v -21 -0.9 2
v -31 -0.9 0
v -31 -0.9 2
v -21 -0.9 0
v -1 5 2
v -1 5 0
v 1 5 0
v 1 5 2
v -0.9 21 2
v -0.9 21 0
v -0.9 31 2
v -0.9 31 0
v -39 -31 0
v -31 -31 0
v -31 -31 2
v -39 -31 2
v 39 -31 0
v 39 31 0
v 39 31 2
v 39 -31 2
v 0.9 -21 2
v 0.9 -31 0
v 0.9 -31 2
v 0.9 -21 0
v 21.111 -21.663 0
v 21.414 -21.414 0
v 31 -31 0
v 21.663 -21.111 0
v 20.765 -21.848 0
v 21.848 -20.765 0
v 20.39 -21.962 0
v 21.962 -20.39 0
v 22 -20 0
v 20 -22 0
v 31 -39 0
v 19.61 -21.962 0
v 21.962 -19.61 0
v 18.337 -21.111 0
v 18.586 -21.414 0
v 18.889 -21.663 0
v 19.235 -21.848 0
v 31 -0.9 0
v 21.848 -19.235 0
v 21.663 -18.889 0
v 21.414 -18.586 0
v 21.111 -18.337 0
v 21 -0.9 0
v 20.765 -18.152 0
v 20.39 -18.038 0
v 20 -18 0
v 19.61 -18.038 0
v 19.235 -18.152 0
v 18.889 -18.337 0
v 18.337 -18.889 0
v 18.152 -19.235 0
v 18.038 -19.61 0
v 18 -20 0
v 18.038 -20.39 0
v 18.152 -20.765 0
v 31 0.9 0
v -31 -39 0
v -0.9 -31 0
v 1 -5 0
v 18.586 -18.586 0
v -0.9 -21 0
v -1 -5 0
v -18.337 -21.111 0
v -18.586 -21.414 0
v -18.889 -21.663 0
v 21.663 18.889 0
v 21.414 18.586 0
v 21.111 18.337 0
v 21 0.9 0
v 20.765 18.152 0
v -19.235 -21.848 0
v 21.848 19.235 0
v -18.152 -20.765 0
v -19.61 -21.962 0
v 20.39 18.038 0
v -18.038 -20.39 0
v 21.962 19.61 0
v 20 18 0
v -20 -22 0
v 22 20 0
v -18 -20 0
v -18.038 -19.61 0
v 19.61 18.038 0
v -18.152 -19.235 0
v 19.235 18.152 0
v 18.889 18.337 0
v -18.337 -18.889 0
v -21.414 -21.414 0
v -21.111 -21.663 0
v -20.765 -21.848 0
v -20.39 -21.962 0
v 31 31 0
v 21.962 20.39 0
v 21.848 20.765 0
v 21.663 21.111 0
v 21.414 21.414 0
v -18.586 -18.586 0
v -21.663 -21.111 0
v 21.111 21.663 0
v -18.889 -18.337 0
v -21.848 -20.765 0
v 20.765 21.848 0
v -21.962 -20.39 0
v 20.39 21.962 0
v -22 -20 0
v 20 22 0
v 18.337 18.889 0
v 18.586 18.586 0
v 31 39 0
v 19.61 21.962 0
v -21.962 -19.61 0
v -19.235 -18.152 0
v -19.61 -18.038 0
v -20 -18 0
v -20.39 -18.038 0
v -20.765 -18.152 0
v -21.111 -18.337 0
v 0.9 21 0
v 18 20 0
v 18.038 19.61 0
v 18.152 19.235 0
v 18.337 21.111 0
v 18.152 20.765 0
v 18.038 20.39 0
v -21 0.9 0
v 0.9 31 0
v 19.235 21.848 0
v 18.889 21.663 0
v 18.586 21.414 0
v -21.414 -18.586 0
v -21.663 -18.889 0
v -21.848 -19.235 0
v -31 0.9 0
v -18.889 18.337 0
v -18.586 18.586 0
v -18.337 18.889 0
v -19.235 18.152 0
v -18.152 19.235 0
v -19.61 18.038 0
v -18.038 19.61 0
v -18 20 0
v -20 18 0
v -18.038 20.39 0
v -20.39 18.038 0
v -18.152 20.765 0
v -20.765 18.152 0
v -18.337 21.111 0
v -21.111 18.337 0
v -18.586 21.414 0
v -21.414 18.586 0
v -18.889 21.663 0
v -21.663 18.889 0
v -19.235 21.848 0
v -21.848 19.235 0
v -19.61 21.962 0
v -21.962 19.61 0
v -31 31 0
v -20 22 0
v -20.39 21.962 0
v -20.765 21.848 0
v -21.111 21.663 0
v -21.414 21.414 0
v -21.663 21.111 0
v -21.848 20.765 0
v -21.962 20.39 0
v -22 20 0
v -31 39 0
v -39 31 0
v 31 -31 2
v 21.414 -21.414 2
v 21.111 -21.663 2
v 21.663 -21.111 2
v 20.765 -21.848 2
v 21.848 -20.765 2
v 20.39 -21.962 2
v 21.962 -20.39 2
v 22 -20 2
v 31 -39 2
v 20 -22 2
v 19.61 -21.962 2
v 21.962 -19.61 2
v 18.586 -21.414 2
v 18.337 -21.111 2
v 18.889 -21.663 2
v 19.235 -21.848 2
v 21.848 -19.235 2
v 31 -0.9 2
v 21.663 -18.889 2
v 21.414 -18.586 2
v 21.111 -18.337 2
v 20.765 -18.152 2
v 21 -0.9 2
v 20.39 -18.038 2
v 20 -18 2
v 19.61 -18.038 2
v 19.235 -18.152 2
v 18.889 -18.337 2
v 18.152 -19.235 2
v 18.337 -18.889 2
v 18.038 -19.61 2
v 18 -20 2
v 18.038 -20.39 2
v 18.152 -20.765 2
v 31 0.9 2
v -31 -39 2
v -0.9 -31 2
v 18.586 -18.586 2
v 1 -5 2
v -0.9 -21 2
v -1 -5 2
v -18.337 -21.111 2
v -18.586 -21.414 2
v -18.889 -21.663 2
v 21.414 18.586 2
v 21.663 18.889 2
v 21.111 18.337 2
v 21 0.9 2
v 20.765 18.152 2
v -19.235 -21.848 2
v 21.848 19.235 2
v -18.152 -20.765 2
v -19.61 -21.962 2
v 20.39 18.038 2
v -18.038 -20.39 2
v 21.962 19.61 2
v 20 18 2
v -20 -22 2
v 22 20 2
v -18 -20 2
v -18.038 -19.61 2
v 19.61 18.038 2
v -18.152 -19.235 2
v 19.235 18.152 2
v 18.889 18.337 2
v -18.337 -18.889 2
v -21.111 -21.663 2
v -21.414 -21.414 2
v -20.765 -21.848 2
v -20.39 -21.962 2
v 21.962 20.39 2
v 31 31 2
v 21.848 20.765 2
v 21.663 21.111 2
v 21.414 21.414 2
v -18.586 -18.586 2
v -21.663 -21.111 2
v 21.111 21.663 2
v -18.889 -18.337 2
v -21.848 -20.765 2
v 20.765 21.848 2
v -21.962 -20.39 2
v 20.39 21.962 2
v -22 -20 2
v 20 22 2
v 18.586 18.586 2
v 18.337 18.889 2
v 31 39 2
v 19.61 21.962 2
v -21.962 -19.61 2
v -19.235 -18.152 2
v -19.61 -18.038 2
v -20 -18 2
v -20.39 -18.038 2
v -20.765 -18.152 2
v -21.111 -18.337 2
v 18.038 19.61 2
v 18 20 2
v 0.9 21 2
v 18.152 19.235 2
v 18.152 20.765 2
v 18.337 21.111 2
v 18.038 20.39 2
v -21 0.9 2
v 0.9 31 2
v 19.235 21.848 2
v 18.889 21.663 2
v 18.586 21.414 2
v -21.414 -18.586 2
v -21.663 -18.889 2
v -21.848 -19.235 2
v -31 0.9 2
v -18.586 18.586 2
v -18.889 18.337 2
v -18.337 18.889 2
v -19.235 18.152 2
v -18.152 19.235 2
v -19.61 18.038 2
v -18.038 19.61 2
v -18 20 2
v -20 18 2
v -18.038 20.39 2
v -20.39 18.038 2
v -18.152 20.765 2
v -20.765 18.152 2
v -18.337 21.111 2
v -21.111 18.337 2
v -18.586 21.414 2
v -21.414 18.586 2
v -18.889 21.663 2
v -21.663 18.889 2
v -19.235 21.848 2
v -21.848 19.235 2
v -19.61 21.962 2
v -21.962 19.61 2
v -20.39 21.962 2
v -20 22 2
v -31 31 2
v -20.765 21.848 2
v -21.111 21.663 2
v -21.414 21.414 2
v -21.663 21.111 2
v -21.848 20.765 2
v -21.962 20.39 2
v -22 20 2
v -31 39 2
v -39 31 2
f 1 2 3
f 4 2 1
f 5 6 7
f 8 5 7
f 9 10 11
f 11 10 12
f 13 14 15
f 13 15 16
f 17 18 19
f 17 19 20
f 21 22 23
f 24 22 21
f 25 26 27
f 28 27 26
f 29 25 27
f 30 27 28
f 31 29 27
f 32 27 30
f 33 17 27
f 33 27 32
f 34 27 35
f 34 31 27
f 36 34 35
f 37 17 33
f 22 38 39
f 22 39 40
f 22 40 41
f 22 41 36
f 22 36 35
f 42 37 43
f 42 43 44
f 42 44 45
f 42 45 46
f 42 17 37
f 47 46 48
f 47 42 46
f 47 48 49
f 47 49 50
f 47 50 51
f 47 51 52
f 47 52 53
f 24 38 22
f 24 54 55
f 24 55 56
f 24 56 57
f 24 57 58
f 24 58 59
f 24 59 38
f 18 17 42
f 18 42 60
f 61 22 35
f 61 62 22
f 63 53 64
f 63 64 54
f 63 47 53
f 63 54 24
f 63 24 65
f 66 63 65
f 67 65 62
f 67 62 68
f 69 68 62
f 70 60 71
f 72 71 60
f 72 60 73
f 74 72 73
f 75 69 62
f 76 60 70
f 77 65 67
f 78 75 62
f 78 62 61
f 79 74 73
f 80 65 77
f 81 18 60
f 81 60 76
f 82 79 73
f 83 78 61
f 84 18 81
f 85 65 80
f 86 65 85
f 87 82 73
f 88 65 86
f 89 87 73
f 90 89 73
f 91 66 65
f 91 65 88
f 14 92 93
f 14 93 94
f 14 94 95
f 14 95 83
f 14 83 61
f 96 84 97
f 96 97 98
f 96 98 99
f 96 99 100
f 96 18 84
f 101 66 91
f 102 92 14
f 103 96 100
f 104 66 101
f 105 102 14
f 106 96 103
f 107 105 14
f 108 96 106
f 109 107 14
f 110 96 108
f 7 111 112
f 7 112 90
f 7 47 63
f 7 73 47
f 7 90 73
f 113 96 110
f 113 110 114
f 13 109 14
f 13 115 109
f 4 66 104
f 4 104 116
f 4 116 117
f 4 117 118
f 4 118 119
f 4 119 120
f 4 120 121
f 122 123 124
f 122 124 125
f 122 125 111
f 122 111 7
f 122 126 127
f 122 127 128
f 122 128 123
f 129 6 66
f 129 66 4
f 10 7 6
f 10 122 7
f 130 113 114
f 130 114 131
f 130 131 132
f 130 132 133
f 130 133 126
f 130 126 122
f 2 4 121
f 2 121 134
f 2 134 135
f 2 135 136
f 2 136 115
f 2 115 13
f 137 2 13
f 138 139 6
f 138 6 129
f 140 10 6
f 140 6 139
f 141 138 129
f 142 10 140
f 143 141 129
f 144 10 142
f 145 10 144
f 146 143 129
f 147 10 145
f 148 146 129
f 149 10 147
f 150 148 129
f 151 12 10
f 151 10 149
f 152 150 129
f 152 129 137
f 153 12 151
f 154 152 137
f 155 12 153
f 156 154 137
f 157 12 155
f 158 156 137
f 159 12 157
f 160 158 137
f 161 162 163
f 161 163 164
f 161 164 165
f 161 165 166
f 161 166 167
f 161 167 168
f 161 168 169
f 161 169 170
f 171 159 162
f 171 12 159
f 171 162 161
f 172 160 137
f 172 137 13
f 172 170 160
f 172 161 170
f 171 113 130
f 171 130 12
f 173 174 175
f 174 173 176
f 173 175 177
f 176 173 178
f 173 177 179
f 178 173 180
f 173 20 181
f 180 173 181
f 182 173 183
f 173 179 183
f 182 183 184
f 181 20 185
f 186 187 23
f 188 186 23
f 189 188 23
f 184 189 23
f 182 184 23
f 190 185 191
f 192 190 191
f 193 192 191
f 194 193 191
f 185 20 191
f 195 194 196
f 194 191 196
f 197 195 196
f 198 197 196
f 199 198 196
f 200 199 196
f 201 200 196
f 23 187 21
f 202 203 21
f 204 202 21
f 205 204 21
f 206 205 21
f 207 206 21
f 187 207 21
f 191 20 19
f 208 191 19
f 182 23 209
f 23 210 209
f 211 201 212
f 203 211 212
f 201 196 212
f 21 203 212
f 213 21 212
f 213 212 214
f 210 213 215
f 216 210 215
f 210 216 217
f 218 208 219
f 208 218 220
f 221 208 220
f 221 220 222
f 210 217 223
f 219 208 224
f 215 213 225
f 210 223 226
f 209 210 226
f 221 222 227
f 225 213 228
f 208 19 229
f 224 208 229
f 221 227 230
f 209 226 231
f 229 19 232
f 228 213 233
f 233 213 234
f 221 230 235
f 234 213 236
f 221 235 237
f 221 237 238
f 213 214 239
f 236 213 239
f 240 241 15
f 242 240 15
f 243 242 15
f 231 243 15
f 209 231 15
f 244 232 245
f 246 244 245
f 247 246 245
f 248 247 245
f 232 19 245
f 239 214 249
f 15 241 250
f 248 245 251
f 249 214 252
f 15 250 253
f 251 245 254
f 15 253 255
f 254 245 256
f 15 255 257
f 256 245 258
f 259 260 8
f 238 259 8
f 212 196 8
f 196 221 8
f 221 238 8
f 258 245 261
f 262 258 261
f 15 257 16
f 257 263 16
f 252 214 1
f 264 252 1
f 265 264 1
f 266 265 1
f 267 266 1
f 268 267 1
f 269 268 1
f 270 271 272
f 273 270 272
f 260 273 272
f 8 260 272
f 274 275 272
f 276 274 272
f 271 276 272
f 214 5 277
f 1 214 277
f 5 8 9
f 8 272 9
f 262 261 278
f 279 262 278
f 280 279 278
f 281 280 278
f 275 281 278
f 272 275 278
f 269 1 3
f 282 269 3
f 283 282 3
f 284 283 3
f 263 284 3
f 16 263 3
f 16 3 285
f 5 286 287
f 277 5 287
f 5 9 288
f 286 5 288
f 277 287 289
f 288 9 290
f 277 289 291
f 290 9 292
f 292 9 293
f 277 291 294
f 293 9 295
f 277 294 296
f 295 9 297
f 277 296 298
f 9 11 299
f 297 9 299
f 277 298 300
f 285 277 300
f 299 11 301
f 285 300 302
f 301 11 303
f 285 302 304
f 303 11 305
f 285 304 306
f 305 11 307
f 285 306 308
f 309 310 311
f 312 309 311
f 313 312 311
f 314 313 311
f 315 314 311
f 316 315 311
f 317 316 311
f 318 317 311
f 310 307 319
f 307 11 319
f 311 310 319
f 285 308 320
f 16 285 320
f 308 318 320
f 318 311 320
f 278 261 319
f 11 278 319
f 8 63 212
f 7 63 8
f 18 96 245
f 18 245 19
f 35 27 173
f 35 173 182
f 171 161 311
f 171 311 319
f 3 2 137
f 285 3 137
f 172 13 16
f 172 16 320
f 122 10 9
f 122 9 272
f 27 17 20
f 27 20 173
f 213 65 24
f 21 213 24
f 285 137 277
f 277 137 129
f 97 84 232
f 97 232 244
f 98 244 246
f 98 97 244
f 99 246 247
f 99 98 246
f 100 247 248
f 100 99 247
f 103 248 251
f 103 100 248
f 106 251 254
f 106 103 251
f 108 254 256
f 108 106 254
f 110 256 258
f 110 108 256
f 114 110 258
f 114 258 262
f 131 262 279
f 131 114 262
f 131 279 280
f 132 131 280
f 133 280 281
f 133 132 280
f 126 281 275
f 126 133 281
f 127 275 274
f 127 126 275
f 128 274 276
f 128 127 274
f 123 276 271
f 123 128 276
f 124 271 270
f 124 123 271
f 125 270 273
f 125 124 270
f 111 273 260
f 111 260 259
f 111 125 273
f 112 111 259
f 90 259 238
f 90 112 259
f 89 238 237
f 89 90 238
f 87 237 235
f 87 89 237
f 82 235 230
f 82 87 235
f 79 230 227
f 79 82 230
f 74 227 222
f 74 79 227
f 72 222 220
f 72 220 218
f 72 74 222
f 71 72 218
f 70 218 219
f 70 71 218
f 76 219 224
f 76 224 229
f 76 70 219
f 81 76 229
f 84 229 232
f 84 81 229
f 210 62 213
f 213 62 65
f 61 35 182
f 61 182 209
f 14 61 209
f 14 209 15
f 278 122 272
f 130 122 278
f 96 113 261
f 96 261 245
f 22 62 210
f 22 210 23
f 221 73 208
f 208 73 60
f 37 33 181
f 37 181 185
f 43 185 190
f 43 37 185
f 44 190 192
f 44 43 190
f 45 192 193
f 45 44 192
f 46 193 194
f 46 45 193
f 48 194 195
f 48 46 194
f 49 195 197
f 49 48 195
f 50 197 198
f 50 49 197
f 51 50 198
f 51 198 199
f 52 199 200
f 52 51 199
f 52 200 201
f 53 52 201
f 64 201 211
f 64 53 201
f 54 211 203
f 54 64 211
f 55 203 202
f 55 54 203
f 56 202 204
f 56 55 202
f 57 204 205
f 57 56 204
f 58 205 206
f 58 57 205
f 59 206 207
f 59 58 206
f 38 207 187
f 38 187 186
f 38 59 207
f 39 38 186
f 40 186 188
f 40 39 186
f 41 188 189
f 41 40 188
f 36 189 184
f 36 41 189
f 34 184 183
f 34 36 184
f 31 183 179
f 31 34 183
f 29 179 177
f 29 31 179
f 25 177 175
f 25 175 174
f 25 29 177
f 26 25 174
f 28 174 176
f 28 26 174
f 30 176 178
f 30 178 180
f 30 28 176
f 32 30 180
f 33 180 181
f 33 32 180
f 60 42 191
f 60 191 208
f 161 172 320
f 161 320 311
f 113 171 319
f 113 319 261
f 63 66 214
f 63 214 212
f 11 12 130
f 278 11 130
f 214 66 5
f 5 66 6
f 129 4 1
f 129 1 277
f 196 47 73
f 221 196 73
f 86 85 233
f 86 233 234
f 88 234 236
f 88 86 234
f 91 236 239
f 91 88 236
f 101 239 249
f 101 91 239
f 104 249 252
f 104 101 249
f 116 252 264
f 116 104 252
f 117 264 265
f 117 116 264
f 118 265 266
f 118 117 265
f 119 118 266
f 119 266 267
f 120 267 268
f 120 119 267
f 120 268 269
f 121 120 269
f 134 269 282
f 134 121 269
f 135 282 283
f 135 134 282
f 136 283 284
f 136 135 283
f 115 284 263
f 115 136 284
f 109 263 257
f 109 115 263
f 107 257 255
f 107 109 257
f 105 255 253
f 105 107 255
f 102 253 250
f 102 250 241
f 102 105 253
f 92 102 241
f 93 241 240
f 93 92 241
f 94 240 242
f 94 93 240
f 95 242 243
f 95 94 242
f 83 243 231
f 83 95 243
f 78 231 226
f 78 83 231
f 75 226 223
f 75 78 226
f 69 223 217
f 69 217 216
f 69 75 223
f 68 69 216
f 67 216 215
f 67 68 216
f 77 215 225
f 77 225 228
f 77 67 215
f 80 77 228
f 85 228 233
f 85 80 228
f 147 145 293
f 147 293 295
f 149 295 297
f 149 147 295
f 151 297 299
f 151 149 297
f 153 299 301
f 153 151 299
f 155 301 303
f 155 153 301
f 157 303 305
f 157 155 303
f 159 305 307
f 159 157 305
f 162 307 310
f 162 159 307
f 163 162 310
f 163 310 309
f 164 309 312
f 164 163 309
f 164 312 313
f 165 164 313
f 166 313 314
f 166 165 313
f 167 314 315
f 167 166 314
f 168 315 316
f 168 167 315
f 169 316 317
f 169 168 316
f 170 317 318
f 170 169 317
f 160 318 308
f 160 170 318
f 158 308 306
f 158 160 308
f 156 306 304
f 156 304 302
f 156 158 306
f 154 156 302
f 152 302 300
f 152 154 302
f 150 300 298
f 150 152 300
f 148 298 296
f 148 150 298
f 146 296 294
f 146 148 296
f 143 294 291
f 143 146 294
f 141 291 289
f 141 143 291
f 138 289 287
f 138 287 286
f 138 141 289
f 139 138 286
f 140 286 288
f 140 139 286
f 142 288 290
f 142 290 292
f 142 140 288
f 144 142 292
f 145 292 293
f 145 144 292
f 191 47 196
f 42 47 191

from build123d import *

# Parameters (mm, degrees)
SKETCH_1_R      = 2
SKETCH_1_W      = 1.8
SKETCH_1_H      = 10
SKETCH_1_W_2    = 10
SKETCH_1_H_2    = 1.8
SKETCH_1_W_3    = 2
EXTRUDE_1_DEPTH = 2


with BuildPart() as part:
    # 草圖1 → 填料-伸長1 (new body)
    with BuildSketch(Plane.XY):
        Polygon((-31, 39), (31, 39), (31, 31), (39, 31), (39, -31), (31, -31), (31, -39), (-31, -39), (-31, -31), (-39, -31), (-39, 31), (-31, 31), align=None)
        with Locations((-20, 20)):
            Circle(SKETCH_1_R, mode=Mode.SUBTRACT)
        with Locations((20, 20)):
            Circle(SKETCH_1_R, mode=Mode.SUBTRACT)
        with Locations((20, -20)):
            Circle(SKETCH_1_R, mode=Mode.SUBTRACT)
        with Locations((-20, -20)):
            Circle(SKETCH_1_R, mode=Mode.SUBTRACT)
        with Locations((0, -26)):
            Rectangle(SKETCH_1_W, SKETCH_1_H, mode=Mode.SUBTRACT)
        with Locations((0, 26)):
            Rectangle(SKETCH_1_W, SKETCH_1_H, mode=Mode.SUBTRACT)
        with Locations((-26, 0)):
            Rectangle(SKETCH_1_W_2, SKETCH_1_H_2, mode=Mode.SUBTRACT)
        with Locations((26, 0)):
            Rectangle(SKETCH_1_W_2, SKETCH_1_H_2, mode=Mode.SUBTRACT)
        Rectangle(SKETCH_1_W_3, SKETCH_1_H, mode=Mode.SUBTRACT)
    extrude(amount=EXTRUDE_1_DEPTH)


solid = part.part
